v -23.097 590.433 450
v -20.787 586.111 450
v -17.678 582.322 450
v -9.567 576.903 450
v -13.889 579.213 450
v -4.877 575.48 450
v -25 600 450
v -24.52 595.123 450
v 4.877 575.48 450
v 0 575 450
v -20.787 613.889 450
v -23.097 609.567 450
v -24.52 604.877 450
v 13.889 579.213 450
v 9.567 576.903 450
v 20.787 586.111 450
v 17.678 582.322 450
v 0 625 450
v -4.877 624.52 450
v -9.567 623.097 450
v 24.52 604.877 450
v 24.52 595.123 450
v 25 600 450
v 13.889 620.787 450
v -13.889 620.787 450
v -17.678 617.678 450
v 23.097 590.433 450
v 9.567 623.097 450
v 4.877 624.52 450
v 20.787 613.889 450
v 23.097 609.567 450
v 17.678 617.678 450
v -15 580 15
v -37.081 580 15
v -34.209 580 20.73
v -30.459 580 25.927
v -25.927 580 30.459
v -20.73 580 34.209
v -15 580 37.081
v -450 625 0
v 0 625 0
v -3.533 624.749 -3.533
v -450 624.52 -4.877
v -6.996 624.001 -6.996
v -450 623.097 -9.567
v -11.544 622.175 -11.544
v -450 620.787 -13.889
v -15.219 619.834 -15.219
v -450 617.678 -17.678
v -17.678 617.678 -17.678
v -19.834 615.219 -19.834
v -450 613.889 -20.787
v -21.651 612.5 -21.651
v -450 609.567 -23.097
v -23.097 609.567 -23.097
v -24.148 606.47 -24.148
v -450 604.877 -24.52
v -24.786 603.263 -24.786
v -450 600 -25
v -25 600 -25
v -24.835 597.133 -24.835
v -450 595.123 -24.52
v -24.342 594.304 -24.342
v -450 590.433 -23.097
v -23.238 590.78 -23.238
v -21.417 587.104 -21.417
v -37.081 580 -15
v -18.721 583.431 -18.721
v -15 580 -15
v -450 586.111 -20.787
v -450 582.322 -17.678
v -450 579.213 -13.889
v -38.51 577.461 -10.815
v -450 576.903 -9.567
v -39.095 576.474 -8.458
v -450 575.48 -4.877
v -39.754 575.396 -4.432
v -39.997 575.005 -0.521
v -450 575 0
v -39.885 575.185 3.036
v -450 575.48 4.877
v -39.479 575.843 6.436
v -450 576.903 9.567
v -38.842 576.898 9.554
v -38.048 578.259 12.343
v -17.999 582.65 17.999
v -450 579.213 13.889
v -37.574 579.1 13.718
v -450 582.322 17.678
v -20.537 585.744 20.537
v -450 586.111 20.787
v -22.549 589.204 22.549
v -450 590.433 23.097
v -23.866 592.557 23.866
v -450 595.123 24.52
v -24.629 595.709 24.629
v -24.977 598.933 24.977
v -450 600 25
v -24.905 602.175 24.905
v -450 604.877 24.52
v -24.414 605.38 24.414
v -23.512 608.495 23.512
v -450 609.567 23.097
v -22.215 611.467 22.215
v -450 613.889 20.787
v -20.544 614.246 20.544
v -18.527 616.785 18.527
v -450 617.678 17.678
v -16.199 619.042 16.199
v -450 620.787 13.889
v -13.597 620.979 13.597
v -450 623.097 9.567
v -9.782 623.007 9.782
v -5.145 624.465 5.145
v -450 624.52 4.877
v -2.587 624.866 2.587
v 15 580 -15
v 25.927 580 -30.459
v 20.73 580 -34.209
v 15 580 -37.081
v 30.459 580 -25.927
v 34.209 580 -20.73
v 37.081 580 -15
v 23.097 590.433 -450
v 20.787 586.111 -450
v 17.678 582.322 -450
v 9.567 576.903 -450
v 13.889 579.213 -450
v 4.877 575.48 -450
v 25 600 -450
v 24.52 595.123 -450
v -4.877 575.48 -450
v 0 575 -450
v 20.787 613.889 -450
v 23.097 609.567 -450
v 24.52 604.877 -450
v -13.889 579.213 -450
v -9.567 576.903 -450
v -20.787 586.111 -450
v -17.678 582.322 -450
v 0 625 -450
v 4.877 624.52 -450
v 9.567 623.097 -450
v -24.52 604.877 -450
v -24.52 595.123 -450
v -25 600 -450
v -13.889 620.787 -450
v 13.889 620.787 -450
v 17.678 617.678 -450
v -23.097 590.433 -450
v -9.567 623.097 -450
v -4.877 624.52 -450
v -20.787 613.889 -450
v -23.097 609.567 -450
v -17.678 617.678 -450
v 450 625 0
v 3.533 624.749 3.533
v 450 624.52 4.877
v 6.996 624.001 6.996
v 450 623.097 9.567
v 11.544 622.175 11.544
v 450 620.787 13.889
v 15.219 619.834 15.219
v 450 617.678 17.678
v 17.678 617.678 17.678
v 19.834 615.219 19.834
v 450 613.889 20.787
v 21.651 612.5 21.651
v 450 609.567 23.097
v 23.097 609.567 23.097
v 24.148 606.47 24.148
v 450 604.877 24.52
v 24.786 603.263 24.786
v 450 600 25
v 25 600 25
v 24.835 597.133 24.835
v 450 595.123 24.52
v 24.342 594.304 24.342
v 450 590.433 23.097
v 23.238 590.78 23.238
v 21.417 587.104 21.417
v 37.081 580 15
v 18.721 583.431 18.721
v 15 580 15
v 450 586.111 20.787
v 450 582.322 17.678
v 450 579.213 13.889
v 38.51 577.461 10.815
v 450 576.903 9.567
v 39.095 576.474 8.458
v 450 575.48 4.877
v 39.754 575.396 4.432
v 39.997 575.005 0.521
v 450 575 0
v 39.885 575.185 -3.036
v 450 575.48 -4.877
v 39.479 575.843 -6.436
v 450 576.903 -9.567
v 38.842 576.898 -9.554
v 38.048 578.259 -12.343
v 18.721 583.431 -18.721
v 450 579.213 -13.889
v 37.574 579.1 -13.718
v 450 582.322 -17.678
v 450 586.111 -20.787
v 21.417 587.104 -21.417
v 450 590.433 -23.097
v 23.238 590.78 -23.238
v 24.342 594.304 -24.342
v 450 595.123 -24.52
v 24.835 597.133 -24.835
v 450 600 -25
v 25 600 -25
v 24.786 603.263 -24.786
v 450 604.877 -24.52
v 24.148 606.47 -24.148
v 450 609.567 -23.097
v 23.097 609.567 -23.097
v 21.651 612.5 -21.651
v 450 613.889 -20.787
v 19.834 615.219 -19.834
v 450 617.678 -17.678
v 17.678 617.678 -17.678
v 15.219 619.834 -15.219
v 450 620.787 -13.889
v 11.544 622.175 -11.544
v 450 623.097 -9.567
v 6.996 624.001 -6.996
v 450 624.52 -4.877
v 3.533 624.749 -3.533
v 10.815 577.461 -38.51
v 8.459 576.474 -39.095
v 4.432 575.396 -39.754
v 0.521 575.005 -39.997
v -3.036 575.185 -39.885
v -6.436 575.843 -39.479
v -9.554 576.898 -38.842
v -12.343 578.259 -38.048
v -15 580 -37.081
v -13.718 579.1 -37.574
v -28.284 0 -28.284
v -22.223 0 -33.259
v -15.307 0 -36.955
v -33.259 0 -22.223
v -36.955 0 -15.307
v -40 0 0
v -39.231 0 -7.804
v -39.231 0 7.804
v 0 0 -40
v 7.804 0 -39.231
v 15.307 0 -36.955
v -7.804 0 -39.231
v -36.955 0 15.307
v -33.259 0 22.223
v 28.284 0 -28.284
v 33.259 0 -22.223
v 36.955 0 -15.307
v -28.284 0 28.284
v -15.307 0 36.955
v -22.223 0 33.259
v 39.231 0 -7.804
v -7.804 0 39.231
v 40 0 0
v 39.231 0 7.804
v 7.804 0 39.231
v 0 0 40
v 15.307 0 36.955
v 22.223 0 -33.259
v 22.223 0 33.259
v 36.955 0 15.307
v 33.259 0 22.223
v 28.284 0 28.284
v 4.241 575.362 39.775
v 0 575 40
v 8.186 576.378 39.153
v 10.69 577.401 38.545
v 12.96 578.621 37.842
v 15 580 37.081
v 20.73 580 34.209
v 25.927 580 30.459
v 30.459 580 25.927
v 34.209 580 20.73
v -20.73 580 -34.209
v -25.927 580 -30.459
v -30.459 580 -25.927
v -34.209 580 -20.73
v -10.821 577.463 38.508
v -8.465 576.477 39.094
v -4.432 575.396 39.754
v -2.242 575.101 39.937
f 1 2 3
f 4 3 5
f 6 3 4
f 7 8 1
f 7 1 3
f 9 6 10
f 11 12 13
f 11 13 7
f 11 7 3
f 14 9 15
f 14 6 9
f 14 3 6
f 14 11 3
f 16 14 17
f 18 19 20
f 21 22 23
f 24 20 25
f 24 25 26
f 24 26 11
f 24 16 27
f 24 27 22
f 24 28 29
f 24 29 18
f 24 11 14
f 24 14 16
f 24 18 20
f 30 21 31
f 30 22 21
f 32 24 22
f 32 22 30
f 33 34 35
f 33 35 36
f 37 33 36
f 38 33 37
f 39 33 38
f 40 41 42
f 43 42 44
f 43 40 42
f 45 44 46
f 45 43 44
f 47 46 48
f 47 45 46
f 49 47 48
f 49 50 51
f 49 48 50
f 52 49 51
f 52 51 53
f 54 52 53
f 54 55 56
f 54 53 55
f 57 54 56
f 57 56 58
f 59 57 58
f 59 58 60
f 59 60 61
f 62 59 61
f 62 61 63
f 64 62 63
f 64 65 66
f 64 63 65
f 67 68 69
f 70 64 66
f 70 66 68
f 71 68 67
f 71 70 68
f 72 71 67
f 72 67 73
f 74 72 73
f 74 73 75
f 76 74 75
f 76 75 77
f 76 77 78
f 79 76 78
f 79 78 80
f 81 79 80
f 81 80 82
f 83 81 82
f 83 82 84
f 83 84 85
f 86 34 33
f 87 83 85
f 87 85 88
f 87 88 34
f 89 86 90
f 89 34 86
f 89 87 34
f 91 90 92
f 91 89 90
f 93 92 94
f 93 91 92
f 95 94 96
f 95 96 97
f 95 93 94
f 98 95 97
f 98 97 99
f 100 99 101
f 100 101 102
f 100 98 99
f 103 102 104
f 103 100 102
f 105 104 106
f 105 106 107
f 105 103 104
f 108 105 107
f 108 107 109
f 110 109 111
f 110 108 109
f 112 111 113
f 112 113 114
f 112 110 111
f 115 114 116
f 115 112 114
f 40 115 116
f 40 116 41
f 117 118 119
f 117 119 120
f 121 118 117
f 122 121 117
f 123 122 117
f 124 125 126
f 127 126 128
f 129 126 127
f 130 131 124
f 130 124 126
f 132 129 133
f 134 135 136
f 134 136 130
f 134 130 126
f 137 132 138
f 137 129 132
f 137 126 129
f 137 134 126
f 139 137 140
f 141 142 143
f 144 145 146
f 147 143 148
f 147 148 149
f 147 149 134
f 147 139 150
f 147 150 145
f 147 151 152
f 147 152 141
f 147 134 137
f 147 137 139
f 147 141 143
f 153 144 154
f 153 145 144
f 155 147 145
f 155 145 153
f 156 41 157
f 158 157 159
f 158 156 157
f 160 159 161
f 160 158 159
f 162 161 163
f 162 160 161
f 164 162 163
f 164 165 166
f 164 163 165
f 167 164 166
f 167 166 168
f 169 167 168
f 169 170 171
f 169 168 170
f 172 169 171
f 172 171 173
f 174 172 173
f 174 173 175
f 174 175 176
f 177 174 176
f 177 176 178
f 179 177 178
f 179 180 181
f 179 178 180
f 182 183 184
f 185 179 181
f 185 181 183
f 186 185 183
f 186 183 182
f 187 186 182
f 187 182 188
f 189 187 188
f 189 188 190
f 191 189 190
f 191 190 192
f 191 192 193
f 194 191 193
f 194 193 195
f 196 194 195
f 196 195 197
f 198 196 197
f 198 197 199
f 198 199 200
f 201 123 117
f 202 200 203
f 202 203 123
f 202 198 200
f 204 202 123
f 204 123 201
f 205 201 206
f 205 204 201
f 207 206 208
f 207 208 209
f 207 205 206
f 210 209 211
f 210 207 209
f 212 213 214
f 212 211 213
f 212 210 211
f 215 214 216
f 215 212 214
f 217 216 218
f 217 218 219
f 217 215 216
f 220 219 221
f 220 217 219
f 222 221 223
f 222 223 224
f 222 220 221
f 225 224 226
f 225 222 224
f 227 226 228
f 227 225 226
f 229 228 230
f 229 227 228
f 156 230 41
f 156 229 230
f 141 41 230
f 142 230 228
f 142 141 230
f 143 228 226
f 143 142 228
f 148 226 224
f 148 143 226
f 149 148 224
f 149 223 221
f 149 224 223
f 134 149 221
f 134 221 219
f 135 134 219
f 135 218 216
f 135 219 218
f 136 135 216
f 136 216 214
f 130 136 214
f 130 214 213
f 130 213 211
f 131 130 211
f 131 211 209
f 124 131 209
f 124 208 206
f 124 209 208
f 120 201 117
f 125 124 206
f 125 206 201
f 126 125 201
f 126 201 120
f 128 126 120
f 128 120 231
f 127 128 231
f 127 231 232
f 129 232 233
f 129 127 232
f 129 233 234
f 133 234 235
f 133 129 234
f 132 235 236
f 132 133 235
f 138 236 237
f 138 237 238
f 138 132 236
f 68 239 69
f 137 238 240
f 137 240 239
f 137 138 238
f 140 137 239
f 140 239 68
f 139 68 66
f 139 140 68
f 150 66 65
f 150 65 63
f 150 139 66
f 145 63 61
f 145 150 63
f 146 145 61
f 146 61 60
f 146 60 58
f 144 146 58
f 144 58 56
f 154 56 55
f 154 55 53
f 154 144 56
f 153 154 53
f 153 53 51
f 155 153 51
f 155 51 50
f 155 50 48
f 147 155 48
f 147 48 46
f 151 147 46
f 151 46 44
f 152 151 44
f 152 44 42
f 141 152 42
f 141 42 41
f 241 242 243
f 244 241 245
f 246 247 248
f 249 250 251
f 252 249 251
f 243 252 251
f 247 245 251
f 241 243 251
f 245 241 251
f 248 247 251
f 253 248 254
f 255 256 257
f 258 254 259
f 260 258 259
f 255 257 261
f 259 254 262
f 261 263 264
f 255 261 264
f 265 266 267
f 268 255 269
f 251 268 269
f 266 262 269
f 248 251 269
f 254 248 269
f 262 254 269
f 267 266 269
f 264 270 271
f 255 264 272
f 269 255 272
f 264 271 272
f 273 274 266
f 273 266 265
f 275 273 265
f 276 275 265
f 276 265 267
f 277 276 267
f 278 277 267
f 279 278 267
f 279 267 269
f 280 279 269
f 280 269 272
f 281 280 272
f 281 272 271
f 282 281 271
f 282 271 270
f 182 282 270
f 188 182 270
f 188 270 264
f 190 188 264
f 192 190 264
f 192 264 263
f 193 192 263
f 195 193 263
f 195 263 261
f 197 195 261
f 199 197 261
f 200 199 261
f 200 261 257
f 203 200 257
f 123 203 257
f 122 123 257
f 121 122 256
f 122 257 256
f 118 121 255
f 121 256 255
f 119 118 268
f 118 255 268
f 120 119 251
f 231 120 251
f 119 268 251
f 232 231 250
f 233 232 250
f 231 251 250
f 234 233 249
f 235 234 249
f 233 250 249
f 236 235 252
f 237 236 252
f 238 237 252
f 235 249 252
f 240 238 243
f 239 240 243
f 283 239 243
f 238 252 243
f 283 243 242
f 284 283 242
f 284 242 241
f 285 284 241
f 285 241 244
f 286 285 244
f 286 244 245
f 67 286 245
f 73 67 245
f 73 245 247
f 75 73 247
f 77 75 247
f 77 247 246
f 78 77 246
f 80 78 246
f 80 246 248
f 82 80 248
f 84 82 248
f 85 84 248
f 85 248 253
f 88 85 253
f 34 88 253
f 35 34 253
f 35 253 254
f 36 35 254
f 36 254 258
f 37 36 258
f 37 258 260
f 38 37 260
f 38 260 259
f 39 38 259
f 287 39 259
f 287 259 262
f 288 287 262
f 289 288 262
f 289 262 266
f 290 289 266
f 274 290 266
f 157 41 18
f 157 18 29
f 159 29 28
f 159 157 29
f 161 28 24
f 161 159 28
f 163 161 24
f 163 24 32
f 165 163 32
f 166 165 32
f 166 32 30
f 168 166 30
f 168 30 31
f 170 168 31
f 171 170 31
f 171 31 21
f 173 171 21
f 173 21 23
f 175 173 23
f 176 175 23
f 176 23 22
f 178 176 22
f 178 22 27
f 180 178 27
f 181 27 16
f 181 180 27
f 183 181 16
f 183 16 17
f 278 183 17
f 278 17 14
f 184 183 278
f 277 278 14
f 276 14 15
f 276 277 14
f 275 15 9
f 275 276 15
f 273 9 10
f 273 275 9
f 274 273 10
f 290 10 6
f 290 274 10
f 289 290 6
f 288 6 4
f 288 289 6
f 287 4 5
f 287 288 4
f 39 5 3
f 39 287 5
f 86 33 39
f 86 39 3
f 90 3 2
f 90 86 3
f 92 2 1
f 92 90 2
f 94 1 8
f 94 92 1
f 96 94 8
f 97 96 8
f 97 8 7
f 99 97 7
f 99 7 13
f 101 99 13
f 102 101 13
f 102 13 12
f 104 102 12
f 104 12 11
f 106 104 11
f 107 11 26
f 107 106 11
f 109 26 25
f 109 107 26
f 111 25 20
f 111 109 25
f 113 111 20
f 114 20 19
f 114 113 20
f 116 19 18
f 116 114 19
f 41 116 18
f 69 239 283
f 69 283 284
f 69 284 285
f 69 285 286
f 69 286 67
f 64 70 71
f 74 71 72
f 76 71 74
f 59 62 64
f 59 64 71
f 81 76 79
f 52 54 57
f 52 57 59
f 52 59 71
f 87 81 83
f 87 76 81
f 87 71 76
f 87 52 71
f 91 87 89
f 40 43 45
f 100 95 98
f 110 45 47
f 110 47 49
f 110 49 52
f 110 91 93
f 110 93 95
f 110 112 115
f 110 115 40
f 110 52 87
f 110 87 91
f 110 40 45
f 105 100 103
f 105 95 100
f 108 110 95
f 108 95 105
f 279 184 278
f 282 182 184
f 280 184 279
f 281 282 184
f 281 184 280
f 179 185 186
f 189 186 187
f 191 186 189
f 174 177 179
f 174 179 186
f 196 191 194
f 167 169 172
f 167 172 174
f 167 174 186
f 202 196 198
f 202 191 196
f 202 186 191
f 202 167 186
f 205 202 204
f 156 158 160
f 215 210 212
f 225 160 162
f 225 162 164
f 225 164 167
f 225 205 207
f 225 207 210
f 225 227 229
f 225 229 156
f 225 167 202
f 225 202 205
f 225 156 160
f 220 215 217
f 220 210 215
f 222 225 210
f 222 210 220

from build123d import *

# Parameters (mm, degrees)
SKETCH1_R             = 40
TRUNK_DEPTH           = 580
BRANCH_BASE_PROFILE_R = 25
BRANCHES_COUNT        = 4


with BuildPart() as part:
    # Sketch1 → trunk (new body)
    with BuildSketch(Plane(origin=(0, 0, 0), x_dir=(1, 0, 0), z_dir=(0, 1, 0))):
        with Locations(Location((0, 0, 0), (0, 0, 270))):
            Circle(SKETCH1_R)
    extrude(amount=TRUNK_DEPTH)

    # branch base: sweep along a path in Sketch2
    with BuildLine(Plane(origin=(0, 0, 0), x_dir=(0, 0, -1), z_dir=(1, 0, 0))) as branch_base_path:
        Line((0, 600), (-450, 600))
    # branch base profile (on start of the path) → branch base (sweep)
    with BuildSketch(Plane(origin=(0, 600, 0), x_dir=(0, 1, 0), z_dir=(0, 0, 1))):
        Circle(BRANCH_BASE_PROFILE_R)
    branch_base = sweep(path=branch_base_path.line)

    # branches: branch base ×4 about axis
    branches_axis = Axis((0, 0, 0), (0, 1, 0))
    for i in range(1, BRANCHES_COUNT):
        add(branch_base.rotate(branches_axis, i * 360 / BRANCHES_COUNT))


solid = part.part
